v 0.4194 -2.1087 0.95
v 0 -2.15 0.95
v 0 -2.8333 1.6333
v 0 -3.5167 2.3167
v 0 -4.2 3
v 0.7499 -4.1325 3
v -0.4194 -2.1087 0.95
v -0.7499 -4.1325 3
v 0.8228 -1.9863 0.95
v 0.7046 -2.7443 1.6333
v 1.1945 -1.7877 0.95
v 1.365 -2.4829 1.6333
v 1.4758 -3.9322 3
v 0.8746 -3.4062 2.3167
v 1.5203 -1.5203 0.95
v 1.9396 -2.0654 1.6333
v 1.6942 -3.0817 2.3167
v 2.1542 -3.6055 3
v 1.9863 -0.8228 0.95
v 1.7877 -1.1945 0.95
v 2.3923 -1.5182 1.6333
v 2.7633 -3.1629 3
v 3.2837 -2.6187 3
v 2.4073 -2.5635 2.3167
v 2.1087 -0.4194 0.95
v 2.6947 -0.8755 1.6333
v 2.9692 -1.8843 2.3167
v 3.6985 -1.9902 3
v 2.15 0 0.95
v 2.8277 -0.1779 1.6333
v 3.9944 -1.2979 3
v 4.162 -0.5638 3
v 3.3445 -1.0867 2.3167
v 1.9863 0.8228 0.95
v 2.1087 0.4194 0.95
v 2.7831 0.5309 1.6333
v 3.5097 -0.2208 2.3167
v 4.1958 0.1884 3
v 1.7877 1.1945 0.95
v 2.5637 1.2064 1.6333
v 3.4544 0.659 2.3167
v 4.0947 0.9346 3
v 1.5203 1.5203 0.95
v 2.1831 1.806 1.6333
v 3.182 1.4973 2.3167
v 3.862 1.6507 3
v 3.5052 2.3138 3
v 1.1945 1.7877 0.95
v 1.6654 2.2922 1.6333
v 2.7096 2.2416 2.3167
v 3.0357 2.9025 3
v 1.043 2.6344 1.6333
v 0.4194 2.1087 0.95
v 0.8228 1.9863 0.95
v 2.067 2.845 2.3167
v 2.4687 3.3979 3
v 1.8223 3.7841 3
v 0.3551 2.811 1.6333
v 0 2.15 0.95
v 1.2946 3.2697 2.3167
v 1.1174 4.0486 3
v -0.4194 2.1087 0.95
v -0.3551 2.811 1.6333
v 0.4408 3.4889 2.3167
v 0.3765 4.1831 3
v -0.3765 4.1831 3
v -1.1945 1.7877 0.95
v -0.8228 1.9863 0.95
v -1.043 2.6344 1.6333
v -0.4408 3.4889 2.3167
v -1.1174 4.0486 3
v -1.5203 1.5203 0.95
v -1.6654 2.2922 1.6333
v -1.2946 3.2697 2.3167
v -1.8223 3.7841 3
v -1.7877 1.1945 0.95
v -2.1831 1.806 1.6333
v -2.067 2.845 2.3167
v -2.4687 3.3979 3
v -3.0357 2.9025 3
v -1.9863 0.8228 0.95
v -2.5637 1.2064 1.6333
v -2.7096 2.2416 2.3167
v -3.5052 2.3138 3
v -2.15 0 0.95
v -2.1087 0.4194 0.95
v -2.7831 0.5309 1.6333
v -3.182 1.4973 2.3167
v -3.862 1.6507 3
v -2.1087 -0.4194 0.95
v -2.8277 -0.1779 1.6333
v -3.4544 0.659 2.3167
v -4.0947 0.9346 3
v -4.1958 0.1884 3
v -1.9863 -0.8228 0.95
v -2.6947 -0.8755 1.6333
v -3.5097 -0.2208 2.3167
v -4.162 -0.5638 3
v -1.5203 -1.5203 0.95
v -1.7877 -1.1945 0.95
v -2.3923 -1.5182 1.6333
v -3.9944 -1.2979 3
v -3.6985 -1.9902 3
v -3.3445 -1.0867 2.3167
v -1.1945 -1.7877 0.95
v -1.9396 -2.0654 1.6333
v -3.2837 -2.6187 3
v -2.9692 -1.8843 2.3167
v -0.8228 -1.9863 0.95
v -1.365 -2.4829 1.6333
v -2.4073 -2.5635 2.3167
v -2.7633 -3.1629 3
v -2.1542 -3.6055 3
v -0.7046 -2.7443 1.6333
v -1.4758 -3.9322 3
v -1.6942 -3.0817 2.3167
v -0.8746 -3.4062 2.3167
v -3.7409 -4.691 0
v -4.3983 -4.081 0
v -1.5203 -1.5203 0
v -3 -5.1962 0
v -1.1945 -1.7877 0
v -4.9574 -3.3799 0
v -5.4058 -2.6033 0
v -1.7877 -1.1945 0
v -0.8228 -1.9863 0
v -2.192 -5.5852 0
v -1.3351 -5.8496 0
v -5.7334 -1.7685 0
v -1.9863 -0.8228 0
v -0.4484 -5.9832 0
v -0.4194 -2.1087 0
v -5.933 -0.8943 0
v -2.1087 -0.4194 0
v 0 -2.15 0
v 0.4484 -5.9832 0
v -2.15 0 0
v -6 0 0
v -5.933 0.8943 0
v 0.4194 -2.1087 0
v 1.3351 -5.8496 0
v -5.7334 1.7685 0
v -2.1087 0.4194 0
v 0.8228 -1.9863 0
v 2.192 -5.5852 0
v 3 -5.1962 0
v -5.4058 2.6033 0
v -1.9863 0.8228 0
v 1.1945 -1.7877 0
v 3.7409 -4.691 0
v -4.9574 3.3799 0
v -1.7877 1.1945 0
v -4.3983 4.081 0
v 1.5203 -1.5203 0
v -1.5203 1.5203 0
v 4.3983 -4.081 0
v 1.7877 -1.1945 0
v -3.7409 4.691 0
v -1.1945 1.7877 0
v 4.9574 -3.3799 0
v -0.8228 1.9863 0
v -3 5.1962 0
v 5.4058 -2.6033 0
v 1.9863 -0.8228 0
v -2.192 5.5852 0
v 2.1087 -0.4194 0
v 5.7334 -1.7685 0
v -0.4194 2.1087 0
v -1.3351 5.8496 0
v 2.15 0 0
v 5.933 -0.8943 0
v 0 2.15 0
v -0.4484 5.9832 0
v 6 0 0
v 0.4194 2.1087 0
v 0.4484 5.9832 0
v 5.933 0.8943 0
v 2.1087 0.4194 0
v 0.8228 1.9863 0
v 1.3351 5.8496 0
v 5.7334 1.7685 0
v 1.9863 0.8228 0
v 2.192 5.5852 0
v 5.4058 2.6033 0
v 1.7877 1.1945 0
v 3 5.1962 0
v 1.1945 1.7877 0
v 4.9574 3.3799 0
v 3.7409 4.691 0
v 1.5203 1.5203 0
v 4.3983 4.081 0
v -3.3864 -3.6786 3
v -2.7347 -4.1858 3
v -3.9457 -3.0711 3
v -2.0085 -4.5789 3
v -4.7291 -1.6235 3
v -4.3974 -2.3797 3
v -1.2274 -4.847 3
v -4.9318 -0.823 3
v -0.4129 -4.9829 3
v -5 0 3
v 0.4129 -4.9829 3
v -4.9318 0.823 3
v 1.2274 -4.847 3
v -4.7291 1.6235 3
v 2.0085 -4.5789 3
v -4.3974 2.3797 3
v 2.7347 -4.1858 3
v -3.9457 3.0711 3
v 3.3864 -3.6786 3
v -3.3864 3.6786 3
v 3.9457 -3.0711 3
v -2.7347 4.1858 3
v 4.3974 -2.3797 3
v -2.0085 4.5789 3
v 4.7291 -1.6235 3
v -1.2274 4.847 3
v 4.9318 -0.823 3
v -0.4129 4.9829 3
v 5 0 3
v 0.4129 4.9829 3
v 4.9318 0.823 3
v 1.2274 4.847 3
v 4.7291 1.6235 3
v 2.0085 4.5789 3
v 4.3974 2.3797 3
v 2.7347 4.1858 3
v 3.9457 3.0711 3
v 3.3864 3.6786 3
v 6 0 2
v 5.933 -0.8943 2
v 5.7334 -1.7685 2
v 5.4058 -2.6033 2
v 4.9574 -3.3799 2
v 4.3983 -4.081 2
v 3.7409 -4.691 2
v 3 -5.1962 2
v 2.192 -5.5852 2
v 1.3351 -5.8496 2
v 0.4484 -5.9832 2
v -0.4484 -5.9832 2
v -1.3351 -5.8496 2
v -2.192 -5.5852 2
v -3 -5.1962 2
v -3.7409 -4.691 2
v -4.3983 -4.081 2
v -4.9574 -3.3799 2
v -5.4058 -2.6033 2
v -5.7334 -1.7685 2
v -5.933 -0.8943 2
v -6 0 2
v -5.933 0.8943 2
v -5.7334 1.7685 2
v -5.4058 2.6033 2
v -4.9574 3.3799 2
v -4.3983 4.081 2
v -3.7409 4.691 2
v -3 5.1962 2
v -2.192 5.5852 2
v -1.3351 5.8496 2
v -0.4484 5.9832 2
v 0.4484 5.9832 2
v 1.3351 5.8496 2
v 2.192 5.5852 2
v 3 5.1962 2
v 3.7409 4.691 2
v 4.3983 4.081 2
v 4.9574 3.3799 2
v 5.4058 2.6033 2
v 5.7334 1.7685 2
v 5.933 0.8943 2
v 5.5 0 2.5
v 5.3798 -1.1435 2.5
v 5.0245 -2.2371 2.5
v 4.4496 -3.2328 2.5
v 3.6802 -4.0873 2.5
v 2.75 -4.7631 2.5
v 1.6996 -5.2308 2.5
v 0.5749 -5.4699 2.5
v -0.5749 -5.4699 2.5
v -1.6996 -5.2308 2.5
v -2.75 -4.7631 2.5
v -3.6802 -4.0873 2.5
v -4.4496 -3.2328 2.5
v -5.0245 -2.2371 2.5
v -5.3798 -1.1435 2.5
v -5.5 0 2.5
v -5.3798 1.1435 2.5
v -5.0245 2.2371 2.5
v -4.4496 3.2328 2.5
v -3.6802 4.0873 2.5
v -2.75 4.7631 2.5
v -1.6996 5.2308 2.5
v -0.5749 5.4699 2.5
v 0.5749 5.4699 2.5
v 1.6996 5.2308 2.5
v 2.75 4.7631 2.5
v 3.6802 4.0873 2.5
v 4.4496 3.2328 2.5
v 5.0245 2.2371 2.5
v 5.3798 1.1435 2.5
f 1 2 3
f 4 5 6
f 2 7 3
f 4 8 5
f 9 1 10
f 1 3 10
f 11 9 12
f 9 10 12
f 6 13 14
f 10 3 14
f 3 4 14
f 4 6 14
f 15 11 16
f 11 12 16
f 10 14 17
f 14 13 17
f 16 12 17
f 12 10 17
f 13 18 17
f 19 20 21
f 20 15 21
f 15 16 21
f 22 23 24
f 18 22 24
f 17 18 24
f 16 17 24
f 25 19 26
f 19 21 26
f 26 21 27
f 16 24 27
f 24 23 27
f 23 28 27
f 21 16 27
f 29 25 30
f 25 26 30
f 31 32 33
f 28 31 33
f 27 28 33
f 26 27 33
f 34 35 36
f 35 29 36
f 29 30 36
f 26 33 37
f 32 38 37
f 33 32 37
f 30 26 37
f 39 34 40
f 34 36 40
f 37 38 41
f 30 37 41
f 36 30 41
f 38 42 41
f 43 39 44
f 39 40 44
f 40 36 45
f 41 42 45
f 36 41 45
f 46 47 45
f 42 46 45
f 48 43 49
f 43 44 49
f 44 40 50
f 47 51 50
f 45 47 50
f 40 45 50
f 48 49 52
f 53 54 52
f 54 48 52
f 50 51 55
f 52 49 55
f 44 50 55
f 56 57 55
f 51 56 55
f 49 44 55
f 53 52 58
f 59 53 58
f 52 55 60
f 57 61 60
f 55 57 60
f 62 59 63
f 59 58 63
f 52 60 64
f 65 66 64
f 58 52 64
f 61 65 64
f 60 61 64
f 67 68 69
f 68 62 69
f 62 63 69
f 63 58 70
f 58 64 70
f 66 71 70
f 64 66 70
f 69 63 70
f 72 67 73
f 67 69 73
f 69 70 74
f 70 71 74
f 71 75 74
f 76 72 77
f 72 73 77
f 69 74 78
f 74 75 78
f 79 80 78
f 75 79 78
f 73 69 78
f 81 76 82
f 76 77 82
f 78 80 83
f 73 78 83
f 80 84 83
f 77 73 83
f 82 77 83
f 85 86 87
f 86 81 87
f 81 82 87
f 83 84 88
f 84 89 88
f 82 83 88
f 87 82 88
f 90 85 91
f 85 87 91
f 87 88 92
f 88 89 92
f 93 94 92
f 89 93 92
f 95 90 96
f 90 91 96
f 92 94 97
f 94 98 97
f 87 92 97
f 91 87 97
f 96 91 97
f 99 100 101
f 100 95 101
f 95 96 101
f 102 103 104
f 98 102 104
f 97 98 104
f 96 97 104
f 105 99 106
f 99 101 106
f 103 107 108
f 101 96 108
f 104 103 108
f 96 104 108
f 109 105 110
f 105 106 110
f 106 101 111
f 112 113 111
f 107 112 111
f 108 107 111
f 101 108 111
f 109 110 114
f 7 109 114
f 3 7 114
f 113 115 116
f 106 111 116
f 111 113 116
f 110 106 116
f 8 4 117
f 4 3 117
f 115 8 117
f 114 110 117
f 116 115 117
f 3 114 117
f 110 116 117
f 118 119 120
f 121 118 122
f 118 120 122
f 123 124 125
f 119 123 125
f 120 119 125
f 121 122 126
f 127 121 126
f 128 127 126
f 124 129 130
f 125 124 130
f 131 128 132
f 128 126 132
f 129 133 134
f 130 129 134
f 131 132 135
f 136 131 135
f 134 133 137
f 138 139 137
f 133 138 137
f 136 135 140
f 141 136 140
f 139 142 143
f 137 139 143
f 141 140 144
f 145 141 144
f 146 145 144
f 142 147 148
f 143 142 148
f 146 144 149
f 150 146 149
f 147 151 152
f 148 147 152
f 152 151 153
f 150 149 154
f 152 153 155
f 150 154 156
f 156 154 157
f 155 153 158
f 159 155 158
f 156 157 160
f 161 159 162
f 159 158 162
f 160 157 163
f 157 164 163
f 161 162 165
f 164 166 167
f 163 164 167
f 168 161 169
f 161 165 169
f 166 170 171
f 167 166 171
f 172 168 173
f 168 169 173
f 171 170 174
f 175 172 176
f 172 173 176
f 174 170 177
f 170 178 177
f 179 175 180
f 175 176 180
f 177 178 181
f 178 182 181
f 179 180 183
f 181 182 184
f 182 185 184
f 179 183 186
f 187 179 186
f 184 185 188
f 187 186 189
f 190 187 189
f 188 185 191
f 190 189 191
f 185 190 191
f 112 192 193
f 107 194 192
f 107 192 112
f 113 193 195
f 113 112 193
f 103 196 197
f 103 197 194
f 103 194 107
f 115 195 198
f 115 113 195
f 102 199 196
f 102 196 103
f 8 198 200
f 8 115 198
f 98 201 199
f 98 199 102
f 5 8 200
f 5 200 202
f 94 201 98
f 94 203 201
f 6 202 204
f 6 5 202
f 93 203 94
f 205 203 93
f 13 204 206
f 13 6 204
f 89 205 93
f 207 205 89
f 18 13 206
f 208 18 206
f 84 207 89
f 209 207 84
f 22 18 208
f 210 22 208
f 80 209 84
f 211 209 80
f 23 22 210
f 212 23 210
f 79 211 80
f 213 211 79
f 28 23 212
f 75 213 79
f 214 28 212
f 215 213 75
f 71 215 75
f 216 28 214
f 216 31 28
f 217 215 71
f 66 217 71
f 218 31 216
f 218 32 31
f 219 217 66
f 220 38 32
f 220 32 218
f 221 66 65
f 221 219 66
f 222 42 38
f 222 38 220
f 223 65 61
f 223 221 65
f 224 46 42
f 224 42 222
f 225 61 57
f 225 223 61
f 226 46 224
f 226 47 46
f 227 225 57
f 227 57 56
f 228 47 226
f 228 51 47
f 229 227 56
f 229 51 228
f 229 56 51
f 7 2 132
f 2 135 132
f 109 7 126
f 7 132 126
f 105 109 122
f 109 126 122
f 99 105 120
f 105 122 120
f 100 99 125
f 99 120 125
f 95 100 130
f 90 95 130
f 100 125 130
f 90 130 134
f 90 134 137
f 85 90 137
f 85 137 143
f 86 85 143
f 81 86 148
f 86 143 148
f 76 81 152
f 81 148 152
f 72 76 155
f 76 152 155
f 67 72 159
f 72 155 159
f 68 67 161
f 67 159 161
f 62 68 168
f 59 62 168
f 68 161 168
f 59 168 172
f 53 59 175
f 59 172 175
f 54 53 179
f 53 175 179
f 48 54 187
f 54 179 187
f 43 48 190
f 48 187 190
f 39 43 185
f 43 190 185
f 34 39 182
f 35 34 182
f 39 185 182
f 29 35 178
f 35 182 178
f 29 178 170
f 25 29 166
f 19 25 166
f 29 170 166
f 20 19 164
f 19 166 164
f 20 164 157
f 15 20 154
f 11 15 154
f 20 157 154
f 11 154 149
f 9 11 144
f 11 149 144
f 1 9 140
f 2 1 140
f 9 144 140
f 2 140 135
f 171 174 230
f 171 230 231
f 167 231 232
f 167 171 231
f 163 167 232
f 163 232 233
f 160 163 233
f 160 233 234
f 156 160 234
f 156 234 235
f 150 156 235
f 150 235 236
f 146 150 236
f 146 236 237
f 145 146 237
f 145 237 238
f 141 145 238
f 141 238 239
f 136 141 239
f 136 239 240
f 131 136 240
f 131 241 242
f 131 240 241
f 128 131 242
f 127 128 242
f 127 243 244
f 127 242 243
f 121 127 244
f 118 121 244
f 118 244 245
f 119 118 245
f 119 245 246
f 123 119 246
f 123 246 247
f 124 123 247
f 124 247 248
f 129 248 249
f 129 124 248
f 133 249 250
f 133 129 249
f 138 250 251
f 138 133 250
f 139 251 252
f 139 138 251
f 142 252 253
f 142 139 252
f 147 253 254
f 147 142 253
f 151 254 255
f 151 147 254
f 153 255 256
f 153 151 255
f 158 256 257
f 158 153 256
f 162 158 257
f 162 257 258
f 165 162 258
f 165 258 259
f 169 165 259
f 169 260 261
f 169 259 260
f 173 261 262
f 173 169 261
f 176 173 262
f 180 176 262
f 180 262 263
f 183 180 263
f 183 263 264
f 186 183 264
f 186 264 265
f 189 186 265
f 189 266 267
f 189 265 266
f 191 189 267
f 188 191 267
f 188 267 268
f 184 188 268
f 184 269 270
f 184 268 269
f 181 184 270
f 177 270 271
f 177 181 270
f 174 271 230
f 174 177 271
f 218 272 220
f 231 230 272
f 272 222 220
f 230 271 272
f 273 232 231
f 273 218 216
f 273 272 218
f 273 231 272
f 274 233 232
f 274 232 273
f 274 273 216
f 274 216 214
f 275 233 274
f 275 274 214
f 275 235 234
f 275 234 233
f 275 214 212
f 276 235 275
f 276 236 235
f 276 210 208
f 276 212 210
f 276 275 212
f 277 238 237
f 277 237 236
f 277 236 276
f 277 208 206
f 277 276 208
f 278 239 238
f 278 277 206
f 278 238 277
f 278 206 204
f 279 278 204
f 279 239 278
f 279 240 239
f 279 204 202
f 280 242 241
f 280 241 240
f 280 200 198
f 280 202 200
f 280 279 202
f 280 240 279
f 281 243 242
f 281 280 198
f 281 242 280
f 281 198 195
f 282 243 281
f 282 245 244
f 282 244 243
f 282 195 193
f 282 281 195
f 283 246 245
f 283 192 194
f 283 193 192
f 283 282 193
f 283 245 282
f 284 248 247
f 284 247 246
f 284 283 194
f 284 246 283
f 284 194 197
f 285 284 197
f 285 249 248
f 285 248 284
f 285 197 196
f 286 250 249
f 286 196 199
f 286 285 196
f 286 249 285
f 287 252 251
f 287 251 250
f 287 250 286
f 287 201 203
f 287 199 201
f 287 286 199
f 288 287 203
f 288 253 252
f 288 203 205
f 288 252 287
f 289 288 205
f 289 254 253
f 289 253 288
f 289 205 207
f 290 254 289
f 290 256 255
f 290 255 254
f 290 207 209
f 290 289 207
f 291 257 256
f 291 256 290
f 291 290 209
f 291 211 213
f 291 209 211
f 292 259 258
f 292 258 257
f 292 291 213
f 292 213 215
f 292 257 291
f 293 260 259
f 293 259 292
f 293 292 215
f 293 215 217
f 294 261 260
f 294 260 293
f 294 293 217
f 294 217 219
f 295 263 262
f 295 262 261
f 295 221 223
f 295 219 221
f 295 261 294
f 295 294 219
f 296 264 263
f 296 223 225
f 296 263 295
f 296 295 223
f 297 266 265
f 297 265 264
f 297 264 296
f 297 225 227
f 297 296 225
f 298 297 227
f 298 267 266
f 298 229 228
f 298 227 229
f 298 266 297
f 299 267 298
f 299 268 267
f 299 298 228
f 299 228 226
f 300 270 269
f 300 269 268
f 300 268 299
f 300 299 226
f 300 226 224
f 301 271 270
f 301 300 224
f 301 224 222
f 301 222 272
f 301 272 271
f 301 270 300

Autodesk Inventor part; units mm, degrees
ref_plane "YZ Plane" through (0, 0, 0) normal (1, 0, 0) x (0, 1, 0)
ref_plane "XZ Plane" through (0, 0, 0) normal (0, 1, 0) x (-1, 0, 0)
ref_plane "XY Plane" through (0, 0, 0) normal (0, 0, 1) x (1, 0, 0)
sketch "Skizze1" plane through (0, 0, 0) normal (0, 0, 1) x (1, 0, 0)
  circle A0 centre (0, 0) radius 6
  dimension "d0" = 12
extrude "Extrusion1" add sketch "Skizze1" along normal blind 3
chamfer "Fasen1" distance 1 angle 45 1 edges at (-6, 0, 3)
sketch "Skizze2" plane through (0, 0, 3) normal (0, 0, 1) x (1, 0, 0)
  circle A0 centre (0, 0) radius 5 projected
hole "Bohrung1" at (0, 0, 3) direction (0, 0, -1) diameter 4.3 depth 3 countersink diameter 8.4 countersink angle 90
properties part number "Druckscheibe" material "Titan"
